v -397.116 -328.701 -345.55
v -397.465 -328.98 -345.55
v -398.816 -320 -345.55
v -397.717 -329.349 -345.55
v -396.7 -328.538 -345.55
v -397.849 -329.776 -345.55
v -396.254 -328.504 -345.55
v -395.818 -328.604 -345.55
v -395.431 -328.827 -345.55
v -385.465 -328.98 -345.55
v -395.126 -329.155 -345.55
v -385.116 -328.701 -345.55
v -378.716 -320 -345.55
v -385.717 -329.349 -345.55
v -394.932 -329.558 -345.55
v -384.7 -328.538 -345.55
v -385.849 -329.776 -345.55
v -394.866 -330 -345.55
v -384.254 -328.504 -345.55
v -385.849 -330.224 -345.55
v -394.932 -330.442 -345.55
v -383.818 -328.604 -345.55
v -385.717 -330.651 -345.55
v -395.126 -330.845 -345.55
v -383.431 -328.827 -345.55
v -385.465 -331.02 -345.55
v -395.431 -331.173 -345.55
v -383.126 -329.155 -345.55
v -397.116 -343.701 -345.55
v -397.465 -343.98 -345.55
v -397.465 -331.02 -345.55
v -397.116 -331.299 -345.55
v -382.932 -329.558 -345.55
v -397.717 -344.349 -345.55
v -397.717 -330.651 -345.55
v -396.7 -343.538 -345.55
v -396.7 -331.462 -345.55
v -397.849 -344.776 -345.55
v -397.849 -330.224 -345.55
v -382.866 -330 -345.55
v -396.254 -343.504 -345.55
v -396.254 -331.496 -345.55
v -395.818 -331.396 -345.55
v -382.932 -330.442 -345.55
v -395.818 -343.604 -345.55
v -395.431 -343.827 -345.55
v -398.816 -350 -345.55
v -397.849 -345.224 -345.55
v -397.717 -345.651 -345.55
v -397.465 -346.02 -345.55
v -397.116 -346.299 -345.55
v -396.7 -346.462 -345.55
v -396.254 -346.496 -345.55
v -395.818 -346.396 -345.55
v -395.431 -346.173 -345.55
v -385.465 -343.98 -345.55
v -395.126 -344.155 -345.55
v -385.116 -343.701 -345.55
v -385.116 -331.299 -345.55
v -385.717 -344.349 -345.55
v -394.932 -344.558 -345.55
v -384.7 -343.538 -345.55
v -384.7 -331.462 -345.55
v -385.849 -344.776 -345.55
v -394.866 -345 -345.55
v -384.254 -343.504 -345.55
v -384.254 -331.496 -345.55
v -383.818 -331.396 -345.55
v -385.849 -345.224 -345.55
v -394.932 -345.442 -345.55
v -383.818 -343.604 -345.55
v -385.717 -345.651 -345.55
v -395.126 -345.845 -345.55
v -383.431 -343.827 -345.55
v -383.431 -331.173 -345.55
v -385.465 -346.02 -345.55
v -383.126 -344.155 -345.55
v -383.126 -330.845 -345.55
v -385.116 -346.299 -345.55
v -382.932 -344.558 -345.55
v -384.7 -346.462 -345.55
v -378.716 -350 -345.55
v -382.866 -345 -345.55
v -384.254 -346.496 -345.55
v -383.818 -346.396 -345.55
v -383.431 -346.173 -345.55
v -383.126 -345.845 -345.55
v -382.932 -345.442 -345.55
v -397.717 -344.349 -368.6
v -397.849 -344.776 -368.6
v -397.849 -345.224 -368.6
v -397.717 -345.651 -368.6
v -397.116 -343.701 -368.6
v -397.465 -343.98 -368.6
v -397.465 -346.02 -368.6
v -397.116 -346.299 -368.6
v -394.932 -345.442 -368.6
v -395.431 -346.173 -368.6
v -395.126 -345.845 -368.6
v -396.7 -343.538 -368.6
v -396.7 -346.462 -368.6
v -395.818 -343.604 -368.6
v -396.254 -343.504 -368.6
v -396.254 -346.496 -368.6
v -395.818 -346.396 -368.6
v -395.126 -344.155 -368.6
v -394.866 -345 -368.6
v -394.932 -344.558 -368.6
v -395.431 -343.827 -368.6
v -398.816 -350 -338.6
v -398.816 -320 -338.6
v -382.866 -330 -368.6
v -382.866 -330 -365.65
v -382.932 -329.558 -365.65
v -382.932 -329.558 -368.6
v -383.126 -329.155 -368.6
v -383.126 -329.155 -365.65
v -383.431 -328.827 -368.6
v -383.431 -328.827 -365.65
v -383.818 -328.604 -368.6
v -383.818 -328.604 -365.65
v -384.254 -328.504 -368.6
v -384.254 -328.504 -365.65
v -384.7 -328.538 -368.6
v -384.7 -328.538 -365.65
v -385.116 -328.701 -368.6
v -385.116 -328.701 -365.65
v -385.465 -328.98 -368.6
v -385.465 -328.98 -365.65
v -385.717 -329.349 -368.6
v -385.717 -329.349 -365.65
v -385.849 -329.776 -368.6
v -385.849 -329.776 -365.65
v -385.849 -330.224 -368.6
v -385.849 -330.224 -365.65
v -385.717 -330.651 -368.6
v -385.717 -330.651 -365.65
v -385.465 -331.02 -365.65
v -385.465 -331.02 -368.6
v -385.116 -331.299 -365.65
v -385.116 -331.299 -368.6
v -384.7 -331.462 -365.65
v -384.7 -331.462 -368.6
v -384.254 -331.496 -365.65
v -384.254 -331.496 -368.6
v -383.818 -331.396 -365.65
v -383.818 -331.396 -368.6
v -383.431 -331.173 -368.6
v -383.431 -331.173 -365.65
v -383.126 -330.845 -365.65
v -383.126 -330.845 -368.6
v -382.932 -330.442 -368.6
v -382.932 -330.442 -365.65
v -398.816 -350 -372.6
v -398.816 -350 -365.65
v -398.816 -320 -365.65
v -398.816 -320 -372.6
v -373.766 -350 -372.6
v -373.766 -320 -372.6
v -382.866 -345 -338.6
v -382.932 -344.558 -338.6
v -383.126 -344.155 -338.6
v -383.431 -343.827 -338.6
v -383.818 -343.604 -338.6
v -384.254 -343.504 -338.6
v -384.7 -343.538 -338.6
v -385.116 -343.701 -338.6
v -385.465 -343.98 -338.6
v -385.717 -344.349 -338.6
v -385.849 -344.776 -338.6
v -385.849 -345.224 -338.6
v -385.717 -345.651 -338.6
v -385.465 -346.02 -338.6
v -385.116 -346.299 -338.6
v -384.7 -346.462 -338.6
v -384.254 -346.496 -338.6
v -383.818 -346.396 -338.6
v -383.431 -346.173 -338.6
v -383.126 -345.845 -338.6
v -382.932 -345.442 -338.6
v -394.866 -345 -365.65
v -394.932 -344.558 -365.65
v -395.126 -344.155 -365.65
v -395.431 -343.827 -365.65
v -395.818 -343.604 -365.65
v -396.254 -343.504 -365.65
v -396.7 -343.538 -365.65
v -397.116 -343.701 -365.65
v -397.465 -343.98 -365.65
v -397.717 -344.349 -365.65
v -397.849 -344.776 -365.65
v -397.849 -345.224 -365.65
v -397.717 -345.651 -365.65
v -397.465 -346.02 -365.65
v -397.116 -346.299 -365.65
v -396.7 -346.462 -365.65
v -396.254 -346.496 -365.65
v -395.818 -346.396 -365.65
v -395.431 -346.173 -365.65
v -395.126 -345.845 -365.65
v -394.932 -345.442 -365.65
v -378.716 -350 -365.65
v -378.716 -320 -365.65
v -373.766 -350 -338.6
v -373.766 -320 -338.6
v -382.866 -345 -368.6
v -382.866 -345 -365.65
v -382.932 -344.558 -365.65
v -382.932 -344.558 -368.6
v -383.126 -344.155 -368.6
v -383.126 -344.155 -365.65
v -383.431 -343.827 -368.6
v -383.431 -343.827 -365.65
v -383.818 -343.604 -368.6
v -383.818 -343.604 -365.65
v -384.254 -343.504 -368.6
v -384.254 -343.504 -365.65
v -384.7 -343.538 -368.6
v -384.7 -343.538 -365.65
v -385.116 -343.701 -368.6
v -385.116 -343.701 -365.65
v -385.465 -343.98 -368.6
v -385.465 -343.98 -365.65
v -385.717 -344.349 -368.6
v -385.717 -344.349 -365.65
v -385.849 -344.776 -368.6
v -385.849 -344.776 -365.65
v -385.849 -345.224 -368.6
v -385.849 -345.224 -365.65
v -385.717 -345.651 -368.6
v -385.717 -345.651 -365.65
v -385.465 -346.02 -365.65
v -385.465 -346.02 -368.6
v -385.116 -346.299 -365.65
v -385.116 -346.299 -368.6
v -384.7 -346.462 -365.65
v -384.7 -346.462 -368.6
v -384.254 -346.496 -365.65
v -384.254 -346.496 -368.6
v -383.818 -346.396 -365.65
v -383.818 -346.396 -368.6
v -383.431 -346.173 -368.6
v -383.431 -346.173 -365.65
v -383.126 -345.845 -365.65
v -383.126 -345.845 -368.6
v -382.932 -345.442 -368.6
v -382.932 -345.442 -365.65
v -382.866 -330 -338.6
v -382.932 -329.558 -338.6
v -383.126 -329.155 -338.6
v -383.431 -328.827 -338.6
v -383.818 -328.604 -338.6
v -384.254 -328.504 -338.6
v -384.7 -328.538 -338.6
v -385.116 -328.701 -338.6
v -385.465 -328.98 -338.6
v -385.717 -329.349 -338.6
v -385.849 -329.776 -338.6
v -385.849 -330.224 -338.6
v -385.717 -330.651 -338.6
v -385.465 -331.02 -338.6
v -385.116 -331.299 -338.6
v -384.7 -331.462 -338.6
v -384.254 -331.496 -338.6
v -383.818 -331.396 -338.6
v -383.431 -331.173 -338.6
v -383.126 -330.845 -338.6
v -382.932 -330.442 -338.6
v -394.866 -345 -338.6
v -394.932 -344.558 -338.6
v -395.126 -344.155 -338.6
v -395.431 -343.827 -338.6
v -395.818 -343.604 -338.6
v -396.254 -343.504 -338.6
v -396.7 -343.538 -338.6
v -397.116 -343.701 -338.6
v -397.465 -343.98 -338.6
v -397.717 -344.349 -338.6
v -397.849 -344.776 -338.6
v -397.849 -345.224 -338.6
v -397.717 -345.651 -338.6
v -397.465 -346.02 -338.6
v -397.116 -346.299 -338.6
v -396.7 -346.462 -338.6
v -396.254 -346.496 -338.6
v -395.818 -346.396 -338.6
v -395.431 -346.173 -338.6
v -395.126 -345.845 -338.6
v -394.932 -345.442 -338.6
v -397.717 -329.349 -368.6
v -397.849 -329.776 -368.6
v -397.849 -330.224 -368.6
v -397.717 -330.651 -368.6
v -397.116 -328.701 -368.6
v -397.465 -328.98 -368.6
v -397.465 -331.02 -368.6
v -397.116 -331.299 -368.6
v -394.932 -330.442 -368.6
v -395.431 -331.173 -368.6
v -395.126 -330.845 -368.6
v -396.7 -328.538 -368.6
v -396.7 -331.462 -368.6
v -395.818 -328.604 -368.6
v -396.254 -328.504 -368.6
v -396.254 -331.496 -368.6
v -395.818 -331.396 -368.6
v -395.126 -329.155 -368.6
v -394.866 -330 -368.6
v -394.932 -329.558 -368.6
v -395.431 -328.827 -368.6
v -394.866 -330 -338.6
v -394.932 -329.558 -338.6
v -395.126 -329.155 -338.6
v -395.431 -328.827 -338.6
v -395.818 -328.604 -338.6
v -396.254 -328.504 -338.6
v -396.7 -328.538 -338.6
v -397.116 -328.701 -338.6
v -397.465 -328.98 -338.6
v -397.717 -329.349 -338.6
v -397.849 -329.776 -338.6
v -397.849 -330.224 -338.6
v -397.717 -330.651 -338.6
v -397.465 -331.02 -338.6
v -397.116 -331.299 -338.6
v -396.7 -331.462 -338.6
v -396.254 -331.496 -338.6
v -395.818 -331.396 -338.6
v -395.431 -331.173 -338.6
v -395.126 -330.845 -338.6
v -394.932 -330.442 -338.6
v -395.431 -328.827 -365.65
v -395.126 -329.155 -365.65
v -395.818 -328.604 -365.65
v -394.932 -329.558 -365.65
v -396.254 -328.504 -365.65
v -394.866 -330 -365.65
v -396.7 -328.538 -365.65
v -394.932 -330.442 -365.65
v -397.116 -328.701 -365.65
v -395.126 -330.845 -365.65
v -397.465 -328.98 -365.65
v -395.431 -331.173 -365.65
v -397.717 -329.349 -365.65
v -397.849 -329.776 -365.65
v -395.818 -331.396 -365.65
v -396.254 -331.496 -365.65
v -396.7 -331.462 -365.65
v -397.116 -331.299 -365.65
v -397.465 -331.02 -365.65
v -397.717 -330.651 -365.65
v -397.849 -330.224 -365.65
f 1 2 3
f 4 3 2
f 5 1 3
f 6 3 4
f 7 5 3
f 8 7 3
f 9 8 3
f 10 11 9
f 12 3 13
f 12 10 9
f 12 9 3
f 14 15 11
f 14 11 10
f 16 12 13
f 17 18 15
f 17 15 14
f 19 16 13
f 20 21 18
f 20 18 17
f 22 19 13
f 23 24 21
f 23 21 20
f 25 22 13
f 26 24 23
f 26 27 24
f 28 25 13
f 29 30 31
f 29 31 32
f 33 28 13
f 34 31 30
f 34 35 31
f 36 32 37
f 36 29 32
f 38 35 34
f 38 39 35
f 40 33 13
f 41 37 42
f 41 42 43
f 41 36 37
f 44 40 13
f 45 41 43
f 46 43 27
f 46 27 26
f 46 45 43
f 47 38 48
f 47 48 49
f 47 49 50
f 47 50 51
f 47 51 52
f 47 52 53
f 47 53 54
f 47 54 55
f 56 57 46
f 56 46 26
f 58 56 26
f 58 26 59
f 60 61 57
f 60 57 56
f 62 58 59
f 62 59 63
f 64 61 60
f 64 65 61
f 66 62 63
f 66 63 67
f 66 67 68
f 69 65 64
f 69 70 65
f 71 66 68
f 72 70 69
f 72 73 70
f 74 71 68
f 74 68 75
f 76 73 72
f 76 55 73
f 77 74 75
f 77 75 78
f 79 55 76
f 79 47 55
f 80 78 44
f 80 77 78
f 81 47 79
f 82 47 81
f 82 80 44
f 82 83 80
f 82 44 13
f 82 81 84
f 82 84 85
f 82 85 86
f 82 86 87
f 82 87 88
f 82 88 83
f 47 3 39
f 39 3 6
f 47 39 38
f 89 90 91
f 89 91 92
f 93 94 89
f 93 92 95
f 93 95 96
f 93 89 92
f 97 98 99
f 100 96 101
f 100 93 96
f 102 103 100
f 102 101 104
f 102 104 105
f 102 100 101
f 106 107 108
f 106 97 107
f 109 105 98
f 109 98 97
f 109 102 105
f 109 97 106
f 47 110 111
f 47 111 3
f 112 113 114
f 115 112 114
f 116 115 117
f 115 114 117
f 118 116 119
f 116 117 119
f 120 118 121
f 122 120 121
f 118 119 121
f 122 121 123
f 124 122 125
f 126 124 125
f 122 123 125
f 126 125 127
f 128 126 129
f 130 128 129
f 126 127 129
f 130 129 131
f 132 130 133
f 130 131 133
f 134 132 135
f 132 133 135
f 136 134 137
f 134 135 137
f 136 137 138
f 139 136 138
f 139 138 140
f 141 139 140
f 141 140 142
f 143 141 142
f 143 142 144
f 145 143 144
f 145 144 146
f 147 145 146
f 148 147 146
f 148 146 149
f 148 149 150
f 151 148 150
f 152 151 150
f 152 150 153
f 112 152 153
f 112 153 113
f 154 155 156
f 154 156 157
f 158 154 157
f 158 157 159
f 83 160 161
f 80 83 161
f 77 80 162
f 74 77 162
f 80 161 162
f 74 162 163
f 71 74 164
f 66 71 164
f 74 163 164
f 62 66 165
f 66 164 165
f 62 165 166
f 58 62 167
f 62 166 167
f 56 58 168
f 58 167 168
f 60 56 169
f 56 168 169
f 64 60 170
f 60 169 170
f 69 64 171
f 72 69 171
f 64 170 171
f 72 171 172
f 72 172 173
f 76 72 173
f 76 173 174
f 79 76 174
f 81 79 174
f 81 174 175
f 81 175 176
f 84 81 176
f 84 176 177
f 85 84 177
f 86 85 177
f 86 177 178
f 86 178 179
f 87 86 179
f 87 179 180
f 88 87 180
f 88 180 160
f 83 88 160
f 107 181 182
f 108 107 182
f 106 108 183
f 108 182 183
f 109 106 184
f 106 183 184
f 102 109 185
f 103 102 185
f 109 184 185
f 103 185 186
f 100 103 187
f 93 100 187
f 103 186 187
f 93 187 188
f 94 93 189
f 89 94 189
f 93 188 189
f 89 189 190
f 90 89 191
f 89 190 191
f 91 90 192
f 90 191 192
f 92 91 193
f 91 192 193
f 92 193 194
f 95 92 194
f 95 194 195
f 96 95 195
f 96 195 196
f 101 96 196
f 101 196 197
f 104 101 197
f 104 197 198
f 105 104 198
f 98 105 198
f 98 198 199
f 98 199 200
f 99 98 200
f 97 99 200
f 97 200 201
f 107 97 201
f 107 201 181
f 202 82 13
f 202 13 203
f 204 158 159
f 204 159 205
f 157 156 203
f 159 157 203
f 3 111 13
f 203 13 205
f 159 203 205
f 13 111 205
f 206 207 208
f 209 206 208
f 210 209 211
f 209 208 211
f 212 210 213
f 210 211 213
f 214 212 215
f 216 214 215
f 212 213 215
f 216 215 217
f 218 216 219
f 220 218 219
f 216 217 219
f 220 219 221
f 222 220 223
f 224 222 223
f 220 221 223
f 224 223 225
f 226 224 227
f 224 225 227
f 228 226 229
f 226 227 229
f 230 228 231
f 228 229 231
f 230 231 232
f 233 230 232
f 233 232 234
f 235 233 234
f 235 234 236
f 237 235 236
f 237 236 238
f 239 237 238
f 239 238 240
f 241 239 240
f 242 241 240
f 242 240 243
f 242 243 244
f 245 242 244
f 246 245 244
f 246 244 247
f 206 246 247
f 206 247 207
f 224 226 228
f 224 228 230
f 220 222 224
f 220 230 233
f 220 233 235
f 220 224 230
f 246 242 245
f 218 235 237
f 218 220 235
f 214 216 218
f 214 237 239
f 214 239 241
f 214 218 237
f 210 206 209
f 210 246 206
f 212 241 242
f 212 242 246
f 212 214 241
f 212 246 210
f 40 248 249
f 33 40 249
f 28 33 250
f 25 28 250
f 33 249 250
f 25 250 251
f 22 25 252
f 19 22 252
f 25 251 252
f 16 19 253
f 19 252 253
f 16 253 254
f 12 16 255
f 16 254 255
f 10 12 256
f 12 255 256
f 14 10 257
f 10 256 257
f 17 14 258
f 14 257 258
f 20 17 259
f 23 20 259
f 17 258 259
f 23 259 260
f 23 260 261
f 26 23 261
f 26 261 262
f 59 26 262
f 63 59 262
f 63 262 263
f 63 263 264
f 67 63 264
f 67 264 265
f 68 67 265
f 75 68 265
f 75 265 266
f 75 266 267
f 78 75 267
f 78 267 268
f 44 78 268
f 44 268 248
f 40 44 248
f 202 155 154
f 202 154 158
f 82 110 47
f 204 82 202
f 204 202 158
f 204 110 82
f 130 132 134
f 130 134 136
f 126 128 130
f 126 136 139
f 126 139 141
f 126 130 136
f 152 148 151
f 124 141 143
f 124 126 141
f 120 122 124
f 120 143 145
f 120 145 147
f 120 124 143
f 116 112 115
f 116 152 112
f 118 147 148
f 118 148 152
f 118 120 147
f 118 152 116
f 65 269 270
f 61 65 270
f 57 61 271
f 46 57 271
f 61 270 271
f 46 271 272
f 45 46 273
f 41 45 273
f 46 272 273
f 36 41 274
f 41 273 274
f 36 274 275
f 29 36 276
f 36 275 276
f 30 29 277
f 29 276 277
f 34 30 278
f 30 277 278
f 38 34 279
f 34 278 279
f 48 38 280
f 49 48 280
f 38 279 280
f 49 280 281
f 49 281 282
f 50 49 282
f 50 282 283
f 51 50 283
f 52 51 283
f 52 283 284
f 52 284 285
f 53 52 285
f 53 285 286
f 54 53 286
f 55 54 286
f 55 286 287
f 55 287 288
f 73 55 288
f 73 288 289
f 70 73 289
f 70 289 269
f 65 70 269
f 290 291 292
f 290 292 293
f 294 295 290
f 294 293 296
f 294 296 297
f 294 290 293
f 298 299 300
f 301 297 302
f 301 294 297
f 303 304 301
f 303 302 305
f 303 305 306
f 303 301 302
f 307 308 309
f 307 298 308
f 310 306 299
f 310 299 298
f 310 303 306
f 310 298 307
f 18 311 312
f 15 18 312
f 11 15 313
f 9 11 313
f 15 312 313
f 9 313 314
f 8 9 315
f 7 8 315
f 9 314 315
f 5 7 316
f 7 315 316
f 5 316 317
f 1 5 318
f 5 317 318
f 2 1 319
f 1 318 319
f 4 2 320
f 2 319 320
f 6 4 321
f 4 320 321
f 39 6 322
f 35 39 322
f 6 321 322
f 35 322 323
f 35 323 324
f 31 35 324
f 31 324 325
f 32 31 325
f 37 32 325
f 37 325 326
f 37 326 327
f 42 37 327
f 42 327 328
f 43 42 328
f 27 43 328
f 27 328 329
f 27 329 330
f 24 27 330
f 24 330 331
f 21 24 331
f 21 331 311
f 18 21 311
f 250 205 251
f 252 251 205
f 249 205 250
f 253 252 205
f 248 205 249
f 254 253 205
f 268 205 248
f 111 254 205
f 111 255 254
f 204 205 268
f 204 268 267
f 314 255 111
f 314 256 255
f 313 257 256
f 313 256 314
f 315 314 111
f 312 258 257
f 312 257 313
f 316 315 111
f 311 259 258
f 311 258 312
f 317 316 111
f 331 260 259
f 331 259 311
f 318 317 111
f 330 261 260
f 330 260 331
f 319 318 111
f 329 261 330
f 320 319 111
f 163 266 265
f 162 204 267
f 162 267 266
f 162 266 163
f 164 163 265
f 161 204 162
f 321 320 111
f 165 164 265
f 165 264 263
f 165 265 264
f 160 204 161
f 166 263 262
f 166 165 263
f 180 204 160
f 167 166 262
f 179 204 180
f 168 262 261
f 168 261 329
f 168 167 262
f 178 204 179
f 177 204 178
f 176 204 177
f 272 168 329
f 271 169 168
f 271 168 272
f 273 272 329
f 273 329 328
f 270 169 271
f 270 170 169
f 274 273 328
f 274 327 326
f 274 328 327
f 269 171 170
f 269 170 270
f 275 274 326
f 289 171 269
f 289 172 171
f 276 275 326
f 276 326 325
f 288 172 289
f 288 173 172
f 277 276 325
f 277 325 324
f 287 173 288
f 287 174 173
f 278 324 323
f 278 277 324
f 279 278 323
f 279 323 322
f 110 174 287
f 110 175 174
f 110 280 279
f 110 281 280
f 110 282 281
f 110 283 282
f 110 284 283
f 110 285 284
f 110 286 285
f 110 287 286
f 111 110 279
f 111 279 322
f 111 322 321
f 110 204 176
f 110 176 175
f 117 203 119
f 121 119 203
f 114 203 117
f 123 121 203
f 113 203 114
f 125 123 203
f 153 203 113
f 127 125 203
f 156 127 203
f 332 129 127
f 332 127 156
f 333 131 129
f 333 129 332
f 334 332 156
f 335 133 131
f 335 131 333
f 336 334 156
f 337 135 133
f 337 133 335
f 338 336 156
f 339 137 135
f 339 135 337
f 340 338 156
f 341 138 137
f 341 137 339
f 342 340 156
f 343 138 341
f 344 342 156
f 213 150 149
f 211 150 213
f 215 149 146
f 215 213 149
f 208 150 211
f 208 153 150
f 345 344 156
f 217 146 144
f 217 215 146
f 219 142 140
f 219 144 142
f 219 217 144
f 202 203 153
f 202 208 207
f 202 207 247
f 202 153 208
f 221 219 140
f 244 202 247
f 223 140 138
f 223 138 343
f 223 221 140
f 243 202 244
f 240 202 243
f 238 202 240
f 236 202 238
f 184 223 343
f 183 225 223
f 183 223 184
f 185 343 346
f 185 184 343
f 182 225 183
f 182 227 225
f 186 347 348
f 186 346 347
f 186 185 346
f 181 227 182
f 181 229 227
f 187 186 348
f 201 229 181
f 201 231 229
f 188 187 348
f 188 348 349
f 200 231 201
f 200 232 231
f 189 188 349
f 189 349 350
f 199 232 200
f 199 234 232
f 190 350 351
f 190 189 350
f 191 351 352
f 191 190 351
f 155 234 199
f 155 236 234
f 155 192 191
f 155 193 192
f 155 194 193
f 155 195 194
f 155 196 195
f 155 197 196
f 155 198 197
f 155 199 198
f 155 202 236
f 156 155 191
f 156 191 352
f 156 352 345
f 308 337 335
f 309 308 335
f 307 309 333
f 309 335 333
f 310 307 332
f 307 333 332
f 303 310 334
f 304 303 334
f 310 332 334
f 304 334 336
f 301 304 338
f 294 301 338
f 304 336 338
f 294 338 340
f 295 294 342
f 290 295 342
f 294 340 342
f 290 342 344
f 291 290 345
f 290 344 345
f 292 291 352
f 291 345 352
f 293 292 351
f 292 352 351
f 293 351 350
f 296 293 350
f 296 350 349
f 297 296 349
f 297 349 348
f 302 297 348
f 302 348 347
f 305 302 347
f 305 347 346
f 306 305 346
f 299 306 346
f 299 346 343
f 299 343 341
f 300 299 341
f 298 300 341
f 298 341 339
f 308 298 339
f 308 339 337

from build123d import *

# Parameters (mm, degrees)
EXTRUDE1_DEPTH     = 30
SKETCH3_R          = 1.5
CUT_EXTRUDE1_DEPTH = 30


with BuildPart() as part:
    # Sketch2 → Extrude1 (new body)
    with BuildSketch(Plane.XZ.offset(350)):
        Polygon((-380.315803698, -338.6), (-398.815803698, -338.6), (-398.815803698, -345.55), (-378.715803698, -345.55), (-378.715803698, -365.65), (-398.815803698, -365.65), (-398.815803698, -372.6), (-380.315803698, -372.6), (-373.765803698, -372.6), (-373.765803698, -338.6), align=None)
    extrude(amount=-EXTRUDE1_DEPTH)

    # Sketch3 → Cut-Extrude1 (cut)
    with BuildSketch(Plane.XY.offset(-338.6)):
        with Locations((-384.365803698, -345)):
            Circle(SKETCH3_R)
        with Locations((-396.365803698, -345)):
            Circle(SKETCH3_R)
        with Locations((-384.365803698, -330)):
            Circle(SKETCH3_R)
        with Locations((-396.365803698, -330)):
            Circle(SKETCH3_R)
    extrude(amount=-CUT_EXTRUDE1_DEPTH, mode=Mode.SUBTRACT)


solid = part.part
